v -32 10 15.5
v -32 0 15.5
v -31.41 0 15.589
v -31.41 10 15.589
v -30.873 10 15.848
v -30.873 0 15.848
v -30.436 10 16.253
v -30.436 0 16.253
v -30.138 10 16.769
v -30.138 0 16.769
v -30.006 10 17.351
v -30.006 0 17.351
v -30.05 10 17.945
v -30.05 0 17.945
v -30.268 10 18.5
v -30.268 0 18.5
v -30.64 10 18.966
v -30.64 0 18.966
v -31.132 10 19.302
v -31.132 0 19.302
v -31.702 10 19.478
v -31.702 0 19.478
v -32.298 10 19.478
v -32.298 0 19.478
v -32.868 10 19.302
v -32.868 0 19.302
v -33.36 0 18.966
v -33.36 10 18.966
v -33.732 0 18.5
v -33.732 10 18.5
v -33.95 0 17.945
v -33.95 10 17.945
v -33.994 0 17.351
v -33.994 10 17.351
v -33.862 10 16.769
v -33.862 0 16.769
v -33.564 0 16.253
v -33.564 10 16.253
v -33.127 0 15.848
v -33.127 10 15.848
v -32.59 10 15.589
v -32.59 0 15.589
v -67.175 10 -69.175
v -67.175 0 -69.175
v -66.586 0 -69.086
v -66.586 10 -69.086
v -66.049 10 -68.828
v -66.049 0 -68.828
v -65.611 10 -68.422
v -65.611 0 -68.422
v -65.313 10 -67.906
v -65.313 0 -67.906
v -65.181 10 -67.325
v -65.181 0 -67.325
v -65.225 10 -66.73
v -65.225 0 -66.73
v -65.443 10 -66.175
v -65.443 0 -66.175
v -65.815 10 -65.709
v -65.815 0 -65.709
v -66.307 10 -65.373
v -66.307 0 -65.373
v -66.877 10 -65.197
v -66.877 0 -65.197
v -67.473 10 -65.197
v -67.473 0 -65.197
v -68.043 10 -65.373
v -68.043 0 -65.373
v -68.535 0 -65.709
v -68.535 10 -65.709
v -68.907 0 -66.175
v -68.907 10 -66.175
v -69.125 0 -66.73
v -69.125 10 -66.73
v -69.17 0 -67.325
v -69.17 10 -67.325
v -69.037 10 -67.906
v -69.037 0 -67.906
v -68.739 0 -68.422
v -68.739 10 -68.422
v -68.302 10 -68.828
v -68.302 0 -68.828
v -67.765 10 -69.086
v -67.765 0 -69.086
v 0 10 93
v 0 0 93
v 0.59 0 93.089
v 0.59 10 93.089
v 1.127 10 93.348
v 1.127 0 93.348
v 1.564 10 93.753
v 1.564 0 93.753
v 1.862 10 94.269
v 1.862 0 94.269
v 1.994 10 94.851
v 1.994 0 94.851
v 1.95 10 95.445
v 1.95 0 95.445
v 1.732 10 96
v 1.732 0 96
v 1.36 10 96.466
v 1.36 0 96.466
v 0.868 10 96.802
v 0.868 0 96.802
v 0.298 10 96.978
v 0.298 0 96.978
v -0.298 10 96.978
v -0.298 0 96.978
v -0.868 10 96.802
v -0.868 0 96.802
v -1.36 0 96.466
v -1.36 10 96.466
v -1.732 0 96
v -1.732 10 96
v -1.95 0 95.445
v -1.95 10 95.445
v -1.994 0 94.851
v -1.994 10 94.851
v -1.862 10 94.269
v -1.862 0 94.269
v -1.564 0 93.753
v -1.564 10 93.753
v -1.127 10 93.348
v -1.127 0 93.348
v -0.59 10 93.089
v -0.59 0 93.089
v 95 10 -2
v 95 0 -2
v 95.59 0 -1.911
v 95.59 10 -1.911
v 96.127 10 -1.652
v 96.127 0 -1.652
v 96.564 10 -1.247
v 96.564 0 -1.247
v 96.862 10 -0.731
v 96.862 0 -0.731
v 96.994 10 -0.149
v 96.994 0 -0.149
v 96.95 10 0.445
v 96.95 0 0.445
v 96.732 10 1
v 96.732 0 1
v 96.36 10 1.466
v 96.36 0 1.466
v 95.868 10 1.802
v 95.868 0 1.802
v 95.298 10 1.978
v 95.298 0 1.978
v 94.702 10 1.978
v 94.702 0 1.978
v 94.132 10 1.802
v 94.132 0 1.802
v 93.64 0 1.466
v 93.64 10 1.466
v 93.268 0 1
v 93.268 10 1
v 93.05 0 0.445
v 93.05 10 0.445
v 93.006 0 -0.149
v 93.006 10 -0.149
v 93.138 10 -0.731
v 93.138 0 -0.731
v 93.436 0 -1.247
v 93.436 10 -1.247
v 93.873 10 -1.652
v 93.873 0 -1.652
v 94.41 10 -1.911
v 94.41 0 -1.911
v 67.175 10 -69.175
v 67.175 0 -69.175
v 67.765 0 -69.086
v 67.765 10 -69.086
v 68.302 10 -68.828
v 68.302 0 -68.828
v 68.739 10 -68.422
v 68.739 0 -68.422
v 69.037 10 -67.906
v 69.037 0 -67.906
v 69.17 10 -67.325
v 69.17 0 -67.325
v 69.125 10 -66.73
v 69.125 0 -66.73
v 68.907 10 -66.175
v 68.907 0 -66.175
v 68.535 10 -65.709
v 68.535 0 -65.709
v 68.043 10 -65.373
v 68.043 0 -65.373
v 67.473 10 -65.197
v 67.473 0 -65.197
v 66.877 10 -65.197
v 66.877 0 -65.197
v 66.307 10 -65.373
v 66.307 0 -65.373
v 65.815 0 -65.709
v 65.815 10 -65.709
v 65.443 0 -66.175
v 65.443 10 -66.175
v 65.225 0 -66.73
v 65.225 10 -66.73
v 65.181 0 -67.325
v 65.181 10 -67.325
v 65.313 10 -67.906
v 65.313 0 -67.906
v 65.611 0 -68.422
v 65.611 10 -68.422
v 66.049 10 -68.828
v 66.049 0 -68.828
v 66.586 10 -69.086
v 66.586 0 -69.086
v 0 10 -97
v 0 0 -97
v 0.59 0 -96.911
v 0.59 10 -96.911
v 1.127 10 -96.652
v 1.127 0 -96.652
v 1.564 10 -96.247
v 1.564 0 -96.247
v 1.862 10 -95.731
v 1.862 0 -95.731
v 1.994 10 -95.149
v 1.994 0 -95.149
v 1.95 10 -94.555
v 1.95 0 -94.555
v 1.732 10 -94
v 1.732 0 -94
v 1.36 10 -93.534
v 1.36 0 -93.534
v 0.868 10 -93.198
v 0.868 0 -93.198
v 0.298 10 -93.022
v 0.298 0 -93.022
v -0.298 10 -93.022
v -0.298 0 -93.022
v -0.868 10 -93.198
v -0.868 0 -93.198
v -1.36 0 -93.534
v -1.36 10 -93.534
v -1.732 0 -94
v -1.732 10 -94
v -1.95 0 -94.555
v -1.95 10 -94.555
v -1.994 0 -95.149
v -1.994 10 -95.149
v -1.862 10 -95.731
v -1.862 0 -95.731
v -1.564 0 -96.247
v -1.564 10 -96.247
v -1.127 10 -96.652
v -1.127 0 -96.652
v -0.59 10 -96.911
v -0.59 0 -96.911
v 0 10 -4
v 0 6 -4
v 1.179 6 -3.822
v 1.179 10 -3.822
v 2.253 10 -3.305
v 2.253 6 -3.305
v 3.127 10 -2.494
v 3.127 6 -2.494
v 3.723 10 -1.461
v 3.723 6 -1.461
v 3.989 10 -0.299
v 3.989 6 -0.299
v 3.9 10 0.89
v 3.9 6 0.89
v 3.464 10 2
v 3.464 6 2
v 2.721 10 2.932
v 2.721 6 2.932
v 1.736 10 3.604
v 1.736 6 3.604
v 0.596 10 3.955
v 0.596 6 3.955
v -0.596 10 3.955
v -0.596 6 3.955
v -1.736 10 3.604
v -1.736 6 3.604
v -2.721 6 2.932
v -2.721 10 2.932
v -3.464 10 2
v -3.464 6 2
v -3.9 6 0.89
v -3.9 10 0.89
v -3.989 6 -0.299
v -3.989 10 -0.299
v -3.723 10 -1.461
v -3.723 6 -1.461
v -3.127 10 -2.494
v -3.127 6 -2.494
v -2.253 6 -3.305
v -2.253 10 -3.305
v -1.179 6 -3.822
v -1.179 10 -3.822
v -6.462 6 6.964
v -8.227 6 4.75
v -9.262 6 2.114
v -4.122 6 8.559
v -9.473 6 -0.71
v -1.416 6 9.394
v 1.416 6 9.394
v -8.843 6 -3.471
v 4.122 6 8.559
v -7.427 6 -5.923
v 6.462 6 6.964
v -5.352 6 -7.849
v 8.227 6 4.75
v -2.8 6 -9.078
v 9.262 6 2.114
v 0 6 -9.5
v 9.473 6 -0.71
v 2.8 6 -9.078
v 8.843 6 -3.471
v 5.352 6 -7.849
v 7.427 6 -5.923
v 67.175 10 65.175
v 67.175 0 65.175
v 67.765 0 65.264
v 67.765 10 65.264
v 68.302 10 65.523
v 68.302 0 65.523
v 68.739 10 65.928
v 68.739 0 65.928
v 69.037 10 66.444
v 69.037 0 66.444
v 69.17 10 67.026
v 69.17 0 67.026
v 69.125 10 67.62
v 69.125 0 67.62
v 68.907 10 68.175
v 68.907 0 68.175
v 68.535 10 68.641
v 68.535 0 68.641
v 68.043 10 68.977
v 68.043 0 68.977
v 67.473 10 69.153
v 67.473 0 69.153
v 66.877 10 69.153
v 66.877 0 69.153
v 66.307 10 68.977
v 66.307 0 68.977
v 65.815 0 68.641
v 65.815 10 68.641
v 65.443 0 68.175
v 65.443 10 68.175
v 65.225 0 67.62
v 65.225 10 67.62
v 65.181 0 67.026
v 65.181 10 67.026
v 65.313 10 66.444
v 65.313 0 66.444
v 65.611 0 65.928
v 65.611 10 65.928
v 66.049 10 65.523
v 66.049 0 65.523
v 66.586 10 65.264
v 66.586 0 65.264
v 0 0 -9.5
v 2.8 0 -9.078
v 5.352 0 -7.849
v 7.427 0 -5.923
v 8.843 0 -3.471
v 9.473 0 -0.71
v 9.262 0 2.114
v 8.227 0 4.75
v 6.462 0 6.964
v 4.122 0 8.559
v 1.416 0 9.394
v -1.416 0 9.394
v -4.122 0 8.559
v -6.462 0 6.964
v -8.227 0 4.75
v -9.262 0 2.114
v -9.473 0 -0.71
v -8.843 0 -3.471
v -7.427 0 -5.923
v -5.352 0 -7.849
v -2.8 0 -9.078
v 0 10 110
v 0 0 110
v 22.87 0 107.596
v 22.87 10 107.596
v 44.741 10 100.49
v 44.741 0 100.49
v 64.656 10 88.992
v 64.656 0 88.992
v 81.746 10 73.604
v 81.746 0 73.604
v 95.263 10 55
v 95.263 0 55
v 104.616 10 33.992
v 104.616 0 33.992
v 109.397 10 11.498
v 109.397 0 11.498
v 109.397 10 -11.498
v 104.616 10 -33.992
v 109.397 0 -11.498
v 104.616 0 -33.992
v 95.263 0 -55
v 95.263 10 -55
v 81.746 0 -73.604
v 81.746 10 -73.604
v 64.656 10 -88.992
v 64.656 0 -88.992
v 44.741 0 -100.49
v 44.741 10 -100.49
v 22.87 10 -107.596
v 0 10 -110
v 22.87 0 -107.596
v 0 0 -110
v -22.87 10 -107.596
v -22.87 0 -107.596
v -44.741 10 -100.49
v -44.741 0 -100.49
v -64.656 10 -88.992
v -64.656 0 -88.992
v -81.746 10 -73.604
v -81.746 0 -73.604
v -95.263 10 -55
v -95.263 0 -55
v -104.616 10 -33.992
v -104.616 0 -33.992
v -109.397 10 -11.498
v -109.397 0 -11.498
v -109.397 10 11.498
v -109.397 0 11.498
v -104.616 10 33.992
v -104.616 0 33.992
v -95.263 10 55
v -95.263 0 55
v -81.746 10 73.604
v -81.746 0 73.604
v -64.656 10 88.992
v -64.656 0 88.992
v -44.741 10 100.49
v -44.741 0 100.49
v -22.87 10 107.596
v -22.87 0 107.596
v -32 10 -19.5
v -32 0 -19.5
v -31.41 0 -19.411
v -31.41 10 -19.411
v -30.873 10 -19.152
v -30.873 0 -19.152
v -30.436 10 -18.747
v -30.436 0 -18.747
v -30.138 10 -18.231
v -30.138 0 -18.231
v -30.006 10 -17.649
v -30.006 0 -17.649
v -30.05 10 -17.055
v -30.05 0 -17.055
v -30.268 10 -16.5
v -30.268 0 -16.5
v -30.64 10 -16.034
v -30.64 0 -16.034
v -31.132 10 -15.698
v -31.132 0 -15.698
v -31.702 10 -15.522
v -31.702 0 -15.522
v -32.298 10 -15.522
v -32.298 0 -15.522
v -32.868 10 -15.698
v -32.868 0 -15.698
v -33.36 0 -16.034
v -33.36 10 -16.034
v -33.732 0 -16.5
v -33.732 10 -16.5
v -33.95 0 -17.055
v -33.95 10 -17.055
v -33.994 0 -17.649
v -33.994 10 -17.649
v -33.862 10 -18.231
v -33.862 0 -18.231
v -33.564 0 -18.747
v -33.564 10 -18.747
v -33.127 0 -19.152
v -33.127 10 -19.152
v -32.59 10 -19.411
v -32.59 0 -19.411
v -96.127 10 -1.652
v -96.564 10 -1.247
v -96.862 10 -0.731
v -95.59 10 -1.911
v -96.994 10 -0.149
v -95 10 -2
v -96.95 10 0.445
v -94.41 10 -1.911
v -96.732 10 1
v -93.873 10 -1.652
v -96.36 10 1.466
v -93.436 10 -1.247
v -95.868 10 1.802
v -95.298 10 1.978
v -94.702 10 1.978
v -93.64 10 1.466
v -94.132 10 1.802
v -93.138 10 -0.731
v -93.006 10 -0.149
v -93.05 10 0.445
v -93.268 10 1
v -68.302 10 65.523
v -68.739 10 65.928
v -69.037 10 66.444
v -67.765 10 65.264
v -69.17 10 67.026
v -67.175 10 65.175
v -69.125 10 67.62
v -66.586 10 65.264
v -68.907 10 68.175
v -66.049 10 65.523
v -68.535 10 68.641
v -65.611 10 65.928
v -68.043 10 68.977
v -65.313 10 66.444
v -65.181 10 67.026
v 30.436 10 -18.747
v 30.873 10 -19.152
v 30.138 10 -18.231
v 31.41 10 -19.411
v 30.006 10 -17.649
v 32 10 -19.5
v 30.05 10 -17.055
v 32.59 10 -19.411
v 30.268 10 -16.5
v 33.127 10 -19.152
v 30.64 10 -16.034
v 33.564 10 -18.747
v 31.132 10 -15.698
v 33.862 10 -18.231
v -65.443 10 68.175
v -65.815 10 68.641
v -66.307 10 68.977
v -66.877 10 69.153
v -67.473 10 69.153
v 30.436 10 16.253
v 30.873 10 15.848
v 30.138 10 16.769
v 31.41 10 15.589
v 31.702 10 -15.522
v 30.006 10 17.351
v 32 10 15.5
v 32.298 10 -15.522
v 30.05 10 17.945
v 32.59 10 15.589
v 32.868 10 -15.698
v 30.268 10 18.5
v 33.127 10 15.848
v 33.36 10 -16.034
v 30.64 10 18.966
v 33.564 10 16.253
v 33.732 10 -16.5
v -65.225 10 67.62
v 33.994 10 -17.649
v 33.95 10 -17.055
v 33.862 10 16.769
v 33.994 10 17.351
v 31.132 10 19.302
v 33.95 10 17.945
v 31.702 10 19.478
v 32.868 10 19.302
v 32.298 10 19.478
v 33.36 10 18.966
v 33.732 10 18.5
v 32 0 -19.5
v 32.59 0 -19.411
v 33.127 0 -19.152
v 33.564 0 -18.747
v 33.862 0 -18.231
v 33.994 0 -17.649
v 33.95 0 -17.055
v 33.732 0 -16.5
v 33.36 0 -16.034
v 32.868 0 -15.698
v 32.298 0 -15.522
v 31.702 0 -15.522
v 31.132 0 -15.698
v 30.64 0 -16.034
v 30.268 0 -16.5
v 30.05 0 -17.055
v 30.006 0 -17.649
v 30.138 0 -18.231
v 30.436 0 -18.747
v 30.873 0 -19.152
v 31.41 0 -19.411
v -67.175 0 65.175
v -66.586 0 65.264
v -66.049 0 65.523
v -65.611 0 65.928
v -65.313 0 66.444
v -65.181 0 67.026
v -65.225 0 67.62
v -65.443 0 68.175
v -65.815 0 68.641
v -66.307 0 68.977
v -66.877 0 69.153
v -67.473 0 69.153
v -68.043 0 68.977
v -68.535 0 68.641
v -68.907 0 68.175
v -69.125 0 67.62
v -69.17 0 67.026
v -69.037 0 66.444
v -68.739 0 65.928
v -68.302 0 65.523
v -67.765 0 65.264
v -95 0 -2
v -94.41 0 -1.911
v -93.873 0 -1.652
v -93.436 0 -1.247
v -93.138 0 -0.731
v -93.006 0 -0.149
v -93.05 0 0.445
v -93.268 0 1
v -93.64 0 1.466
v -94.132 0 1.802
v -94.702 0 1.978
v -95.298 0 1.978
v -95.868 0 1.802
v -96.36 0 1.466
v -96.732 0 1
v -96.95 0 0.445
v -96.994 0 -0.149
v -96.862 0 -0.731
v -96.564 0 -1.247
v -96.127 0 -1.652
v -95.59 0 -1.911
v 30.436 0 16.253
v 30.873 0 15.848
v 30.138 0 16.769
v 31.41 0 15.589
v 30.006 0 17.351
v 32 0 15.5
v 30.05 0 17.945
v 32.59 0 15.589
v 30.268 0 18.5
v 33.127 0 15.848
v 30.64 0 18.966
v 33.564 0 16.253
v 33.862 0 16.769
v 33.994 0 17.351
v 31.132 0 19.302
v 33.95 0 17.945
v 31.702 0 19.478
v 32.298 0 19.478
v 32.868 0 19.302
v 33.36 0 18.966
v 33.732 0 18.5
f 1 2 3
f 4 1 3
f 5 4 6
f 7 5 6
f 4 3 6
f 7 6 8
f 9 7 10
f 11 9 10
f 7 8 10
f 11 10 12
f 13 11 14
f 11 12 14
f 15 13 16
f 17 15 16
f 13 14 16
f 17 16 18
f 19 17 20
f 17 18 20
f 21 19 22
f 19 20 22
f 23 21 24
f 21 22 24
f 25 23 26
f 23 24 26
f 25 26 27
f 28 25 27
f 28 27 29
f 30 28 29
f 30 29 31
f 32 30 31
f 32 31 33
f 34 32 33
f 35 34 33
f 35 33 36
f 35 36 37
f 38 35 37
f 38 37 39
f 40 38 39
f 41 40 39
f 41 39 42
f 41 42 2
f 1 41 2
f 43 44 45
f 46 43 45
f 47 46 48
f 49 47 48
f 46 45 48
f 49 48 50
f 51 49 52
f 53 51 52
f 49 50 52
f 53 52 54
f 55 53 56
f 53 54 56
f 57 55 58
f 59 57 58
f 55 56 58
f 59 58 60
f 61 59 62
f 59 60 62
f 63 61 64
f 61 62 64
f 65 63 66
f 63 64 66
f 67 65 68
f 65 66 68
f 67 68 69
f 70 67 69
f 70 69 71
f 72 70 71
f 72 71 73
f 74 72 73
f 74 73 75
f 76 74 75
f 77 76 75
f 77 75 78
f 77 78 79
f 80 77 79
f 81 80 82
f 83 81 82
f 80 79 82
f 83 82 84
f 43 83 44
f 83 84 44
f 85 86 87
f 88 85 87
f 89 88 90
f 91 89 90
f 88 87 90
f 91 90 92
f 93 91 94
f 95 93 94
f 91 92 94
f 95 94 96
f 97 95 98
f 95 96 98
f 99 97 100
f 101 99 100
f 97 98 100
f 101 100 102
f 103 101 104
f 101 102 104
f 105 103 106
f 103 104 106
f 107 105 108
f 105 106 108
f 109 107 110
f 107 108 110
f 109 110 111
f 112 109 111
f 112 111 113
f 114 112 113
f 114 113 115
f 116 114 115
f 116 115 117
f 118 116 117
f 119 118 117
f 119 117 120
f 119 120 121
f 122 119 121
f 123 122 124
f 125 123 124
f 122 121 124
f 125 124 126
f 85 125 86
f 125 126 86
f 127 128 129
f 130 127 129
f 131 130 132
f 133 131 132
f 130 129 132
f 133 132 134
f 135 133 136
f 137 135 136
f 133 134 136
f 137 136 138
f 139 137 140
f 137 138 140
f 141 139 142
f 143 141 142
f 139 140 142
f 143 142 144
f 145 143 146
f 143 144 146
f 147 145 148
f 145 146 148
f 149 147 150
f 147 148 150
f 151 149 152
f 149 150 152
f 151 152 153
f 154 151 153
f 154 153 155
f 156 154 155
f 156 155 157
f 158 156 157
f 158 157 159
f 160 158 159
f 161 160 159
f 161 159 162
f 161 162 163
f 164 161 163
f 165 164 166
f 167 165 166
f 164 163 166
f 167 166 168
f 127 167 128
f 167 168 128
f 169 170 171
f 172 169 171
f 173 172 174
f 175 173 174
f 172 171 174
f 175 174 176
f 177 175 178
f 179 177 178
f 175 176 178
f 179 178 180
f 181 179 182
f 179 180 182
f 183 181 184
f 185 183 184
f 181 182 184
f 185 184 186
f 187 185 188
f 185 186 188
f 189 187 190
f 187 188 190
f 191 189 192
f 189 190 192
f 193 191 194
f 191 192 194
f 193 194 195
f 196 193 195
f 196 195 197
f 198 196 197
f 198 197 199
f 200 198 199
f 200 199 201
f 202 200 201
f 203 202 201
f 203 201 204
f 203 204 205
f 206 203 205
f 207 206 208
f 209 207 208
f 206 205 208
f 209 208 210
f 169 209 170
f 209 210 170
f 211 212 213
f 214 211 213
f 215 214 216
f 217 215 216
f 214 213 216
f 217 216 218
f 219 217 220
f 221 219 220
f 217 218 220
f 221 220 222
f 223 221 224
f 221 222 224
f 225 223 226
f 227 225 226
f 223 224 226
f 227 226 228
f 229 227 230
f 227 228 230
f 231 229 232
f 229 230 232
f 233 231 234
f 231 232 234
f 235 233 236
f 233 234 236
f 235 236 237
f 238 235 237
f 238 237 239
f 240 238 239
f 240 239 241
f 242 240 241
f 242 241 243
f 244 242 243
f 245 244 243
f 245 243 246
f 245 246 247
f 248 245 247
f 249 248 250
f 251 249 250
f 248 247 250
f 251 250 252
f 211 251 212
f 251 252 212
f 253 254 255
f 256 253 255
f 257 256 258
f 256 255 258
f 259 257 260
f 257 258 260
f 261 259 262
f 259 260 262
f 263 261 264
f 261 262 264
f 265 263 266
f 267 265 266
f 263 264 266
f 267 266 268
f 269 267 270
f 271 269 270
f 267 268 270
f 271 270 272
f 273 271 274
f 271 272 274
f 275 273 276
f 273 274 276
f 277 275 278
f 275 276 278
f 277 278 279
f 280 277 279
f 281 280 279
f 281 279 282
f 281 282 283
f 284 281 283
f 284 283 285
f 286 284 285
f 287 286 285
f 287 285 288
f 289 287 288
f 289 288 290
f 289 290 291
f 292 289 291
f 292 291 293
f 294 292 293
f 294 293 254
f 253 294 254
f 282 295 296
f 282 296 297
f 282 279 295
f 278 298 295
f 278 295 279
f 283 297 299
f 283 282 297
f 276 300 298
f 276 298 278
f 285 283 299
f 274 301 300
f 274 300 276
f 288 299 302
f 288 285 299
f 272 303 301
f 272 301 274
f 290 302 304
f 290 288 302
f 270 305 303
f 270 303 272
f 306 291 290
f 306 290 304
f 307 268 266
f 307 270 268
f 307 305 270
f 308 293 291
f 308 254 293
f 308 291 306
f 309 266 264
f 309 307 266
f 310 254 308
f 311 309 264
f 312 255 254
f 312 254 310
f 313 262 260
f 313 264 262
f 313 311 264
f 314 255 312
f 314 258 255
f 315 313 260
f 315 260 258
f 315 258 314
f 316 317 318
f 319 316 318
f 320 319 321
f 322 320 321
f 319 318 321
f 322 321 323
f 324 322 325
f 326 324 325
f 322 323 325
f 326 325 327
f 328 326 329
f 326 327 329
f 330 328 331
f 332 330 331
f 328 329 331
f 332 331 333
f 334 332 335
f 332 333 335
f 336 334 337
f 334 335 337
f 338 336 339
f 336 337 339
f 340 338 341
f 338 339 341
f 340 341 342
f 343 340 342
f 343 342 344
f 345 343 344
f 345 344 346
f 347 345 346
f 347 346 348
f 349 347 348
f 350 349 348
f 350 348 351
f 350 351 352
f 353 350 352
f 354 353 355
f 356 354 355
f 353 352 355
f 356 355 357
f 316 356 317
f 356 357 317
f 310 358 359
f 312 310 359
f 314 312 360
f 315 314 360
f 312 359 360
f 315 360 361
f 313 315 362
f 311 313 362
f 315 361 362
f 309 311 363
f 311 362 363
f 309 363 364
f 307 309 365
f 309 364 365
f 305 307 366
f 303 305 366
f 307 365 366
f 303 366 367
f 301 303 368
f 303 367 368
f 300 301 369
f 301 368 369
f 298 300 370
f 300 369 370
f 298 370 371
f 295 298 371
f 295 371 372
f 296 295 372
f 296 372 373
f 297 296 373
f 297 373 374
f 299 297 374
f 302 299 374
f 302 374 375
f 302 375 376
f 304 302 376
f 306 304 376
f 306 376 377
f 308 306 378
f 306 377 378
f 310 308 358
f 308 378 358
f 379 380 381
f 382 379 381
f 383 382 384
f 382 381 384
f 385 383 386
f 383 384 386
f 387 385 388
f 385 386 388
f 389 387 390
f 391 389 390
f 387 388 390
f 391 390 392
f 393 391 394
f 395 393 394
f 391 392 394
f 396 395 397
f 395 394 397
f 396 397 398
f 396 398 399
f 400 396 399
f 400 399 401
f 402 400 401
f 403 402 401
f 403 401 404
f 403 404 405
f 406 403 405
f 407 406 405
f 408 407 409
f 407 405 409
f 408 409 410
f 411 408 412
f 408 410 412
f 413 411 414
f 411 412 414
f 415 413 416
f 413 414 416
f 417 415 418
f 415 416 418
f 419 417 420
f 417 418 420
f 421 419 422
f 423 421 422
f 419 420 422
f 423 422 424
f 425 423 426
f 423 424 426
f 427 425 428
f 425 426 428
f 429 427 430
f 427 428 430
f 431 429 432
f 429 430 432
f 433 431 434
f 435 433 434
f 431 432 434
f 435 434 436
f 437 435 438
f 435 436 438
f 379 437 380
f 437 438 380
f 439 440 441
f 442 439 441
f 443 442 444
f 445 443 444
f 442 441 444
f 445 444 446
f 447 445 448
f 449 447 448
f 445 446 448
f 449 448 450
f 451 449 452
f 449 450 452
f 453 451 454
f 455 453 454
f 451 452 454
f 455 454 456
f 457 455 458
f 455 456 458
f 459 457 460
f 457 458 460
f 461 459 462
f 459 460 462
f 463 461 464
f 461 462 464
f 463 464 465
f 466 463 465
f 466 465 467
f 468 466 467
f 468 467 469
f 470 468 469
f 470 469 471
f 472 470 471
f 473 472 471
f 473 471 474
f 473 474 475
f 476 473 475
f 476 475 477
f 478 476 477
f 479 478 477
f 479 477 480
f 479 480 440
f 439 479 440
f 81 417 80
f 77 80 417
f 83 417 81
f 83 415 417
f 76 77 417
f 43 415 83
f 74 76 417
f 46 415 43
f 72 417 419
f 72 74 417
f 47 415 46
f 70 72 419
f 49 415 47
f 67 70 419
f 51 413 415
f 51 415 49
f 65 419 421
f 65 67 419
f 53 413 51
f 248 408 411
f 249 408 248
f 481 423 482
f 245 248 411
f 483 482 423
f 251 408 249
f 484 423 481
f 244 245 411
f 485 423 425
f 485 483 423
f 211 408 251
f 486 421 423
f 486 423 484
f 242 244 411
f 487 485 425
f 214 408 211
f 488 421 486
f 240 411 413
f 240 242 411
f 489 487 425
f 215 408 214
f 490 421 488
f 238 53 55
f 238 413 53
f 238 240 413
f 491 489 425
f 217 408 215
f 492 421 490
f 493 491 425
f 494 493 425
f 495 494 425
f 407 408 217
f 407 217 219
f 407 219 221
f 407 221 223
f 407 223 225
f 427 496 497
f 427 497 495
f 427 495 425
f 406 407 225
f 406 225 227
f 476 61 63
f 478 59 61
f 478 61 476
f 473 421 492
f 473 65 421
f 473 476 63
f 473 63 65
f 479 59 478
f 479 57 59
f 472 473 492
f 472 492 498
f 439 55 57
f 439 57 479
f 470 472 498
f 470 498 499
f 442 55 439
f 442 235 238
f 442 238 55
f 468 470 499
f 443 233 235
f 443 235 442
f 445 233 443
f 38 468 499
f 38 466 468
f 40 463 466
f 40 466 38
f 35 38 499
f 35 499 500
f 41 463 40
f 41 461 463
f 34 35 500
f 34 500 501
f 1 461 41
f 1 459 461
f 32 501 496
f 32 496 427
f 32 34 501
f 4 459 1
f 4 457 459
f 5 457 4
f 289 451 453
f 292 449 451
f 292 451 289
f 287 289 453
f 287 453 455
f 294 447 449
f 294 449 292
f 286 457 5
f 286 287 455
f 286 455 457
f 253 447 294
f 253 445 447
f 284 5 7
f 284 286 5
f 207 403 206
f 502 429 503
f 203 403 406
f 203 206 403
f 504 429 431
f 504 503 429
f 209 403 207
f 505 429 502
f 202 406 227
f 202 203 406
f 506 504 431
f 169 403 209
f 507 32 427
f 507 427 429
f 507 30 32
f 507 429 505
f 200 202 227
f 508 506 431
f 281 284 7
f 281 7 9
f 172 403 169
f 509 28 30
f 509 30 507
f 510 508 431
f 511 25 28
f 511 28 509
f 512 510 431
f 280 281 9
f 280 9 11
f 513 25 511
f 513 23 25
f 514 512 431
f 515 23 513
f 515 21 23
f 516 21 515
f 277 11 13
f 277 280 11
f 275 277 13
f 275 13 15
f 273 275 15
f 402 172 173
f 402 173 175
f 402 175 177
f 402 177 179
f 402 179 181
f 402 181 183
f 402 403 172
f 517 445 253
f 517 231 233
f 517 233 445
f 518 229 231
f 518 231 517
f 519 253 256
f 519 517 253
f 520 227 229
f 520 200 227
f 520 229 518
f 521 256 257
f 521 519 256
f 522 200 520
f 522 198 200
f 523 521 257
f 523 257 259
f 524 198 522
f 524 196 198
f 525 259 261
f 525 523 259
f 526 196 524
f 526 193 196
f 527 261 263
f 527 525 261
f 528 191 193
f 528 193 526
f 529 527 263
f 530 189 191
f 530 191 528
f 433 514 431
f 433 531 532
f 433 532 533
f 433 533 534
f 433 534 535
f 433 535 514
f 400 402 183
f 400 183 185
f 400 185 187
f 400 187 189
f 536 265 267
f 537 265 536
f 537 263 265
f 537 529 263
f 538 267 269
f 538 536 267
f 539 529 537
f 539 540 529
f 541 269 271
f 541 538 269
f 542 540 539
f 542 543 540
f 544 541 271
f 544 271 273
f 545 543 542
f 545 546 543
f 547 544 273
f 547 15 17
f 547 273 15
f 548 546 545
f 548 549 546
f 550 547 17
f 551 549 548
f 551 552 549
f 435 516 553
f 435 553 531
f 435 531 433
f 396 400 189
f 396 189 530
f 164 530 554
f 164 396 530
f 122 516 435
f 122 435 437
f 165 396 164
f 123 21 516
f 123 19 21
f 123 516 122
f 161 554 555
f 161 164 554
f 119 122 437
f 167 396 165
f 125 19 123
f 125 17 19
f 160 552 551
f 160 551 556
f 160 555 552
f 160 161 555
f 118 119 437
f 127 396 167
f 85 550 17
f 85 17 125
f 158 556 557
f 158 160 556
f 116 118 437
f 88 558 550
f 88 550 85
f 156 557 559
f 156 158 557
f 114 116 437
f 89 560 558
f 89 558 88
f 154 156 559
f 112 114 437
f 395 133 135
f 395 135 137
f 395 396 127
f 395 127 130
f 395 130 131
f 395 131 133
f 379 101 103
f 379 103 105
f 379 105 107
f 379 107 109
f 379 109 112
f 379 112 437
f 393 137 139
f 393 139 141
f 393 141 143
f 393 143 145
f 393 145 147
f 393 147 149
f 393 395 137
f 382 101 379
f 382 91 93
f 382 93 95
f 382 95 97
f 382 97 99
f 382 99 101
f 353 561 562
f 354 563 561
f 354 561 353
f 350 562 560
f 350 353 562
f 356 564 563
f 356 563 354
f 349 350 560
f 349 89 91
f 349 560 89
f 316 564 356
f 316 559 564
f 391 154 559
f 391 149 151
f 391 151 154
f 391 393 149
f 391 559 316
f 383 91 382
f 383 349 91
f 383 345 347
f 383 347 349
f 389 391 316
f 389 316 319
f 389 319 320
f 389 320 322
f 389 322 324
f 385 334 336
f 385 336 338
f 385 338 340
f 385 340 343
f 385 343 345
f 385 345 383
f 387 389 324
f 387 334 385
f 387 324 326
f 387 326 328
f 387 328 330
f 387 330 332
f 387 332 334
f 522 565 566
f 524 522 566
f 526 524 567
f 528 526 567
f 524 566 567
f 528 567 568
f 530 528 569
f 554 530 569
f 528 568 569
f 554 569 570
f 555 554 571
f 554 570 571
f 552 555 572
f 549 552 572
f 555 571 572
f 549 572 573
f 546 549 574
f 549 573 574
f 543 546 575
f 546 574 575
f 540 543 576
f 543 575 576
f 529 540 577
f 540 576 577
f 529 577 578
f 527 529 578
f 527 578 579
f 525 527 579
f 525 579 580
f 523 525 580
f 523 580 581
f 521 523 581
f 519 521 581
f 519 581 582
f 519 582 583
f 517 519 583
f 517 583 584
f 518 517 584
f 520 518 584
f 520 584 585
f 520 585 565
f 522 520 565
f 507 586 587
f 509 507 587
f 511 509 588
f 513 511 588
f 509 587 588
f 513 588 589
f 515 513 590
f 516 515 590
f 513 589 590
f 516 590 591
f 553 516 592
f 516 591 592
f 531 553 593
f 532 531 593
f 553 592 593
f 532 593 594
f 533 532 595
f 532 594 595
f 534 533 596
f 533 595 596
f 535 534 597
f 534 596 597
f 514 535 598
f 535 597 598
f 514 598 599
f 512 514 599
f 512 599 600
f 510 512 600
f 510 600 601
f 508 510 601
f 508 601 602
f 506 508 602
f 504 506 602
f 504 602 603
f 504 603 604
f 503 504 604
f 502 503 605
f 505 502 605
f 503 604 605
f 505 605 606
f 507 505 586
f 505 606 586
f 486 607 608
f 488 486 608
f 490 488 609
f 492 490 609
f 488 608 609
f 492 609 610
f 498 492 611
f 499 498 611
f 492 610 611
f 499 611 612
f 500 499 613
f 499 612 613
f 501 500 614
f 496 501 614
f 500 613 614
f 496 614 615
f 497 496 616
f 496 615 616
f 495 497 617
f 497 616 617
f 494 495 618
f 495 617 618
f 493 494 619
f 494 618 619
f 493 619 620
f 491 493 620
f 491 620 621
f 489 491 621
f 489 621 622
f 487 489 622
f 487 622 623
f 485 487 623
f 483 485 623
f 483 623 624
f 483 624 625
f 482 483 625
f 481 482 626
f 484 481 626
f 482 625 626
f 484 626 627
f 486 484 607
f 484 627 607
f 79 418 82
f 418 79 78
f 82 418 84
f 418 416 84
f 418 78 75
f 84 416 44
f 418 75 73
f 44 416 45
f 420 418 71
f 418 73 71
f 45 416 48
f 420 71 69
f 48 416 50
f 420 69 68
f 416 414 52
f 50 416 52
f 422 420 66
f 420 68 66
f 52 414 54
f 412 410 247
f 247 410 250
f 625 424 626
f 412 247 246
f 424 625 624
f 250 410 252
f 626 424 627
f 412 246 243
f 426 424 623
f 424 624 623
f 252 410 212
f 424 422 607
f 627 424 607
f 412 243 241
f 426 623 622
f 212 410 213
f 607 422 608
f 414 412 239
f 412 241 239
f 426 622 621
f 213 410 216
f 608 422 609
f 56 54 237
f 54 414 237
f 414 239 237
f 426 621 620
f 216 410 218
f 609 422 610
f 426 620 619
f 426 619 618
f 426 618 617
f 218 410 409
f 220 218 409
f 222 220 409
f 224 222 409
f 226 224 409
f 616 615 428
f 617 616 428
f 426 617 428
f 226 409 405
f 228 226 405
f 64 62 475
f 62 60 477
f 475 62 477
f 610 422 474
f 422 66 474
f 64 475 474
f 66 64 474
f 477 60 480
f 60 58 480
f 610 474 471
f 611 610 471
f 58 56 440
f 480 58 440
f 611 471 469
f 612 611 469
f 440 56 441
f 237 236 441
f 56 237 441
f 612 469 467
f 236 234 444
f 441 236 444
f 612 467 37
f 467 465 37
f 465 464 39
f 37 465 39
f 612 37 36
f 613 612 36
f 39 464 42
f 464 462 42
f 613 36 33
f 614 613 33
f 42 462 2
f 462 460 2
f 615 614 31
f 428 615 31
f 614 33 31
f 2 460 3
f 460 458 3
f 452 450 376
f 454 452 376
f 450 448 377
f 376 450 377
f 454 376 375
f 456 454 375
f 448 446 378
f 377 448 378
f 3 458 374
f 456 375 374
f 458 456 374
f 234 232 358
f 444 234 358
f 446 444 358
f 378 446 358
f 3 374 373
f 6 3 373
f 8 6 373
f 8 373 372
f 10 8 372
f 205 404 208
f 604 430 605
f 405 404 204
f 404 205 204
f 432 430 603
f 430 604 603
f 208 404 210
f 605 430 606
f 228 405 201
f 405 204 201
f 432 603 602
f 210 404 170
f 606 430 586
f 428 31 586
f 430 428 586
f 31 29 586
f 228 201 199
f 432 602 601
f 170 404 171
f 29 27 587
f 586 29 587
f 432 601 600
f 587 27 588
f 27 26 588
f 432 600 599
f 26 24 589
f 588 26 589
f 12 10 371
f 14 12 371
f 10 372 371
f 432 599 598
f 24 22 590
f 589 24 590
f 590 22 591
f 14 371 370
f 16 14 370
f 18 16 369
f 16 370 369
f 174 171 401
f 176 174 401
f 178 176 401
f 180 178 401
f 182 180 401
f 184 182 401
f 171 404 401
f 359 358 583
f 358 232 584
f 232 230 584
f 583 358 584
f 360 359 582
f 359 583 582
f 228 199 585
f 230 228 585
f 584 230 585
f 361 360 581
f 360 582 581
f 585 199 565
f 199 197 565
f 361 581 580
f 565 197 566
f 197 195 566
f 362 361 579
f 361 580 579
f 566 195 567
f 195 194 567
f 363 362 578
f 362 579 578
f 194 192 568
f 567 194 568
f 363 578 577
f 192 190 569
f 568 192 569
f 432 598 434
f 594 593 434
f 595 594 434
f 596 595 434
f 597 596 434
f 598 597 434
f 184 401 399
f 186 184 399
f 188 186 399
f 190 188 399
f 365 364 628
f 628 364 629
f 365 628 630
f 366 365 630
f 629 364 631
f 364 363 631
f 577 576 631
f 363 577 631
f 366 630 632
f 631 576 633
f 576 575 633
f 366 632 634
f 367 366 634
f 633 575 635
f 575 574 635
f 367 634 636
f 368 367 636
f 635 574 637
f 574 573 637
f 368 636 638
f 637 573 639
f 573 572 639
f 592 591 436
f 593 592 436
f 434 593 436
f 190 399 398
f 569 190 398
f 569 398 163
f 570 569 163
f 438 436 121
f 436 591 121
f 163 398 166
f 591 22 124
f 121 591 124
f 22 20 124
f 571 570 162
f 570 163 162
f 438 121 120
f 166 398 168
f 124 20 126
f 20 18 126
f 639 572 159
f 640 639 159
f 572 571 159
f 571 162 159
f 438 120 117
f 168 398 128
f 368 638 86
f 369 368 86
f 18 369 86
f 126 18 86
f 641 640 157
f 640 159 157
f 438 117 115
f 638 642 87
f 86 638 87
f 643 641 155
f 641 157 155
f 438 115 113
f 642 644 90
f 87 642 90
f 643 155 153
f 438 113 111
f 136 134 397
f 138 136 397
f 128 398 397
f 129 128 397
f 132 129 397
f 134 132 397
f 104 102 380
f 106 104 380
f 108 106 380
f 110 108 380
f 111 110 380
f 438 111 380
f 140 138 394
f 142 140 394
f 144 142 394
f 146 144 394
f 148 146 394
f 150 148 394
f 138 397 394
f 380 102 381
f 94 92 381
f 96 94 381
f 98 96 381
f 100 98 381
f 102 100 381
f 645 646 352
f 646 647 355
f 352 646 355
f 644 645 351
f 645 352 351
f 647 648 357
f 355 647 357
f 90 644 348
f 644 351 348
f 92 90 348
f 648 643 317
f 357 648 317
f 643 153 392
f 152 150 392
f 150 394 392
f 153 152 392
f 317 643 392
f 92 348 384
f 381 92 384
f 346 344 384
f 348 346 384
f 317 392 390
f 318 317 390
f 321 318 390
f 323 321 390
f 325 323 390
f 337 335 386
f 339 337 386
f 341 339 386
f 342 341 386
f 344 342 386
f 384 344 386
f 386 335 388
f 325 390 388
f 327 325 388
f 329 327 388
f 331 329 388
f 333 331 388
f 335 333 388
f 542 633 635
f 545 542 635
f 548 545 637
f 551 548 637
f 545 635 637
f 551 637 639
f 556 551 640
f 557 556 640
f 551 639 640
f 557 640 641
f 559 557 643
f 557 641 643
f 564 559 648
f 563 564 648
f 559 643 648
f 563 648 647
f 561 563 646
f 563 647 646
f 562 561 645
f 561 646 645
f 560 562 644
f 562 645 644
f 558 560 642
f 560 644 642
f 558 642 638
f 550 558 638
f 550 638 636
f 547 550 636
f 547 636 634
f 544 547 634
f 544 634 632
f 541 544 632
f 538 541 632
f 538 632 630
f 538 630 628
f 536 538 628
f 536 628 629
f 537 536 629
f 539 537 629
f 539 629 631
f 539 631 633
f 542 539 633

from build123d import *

# Parameters (mm, degrees)
SKETCH2_R           = 110
BOSS_EXTRUDE2_DEPTH = 10
SKETCH4_R           = 9.5
CUT_EXTRUDE1_DEPTH  = 6
SKETCH6_R           = 4
CUT_EXTRUDE3_DEPTH  = 156.679157243
SKETCH7_R           = 2
CUT_EXTRUDE6_DEPTH  = 156.884572681
SKETCH8_R           = 2
CUT_EXTRUDE7_DEPTH  = 10


with BuildPart() as part:
    # Sketch2 → Boss-Extrude2 (new body)
    with BuildSketch(Plane(origin=(0, 0, 0), x_dir=(1, 0, 0), z_dir=(0, 1, 0))):
        with Locations(Location((0, 0, 0), (0, 0, 270))):
            Circle(SKETCH2_R)
    extrude(amount=BOSS_EXTRUDE2_DEPTH)

    # Sketch4 → Cut-Extrude1 (cut)
    with BuildSketch(Plane(origin=(0, 0, 0), x_dir=(-1, 0, 0), z_dir=(0, -1, 0))):
        with Locations(Location((0, 0, 0), (0, 0, 90))):
            Circle(SKETCH4_R)
    extrude(amount=-CUT_EXTRUDE1_DEPTH, mode=Mode.SUBTRACT)

    # Sketch6 → Cut-Extrude3 (cut, through all)
    with BuildSketch(Plane(origin=(0, 6, 0), x_dir=(-1, 0, 0), z_dir=(0, -1, 0))):
        with Locations(Location((0, 0, 0), (0, 0, 90))):
            Circle(SKETCH6_R)
    extrude(amount=-CUT_EXTRUDE3_DEPTH, mode=Mode.SUBTRACT)

    # Sketch7 → Cut-Extrude6 (cut, through all)
    with BuildSketch(Plane(origin=(0, 0, 0), x_dir=(-1, 0, 0), z_dir=(0, -1, 0))):
        with Locations(Location((32, -17.5, 0), (0, 0, 90))):
            Circle(SKETCH7_R)
        with Locations(Location((32, 17.5, 0), (0, 0, 90))):
            Circle(SKETCH7_R)
        with Locations(Location((-32, 17.5, 0), (0, 0, 90))):
            Circle(SKETCH7_R)
        with Locations(Location((-32, -17.5, 0), (0, 0, 90))):
            Circle(SKETCH7_R)
    extrude(amount=-CUT_EXTRUDE6_DEPTH, mode=Mode.SUBTRACT)

    # Sketch8 → Cut-Extrude7 (cut)
    with BuildSketch(Plane.XZ):
        with Locations(Location((0, 95, 0), (0, 0, 270))):
            Circle(SKETCH8_R)
        with Locations(Location((67.175144213, 67.175144213, 0), (0, 0, 270))):
            Circle(SKETCH8_R)
        with Locations(Location((95, 0, 0), (0, 0, 270))):
            Circle(SKETCH8_R)
        with Locations(Location((67.175144213, -67.175144213, 0), (0, 0, 270))):
            Circle(SKETCH8_R)
        with Locations(Location((0, -95, 0), (0, 0, 270))):
            Circle(SKETCH8_R)
        with Locations(Location((-67.175144213, -67.175144213, 0), (0, 0, 270))):
            Circle(SKETCH8_R)
        with Locations(Location((-95, 0, 0), (0, 0, 270))):
            Circle(SKETCH8_R)
        with Locations(Location((-67.175144213, 67.175144213, 0), (0, 0, 270))):
            Circle(SKETCH8_R)
    extrude(amount=-CUT_EXTRUDE7_DEPTH, mode=Mode.SUBTRACT)


solid = part.part
